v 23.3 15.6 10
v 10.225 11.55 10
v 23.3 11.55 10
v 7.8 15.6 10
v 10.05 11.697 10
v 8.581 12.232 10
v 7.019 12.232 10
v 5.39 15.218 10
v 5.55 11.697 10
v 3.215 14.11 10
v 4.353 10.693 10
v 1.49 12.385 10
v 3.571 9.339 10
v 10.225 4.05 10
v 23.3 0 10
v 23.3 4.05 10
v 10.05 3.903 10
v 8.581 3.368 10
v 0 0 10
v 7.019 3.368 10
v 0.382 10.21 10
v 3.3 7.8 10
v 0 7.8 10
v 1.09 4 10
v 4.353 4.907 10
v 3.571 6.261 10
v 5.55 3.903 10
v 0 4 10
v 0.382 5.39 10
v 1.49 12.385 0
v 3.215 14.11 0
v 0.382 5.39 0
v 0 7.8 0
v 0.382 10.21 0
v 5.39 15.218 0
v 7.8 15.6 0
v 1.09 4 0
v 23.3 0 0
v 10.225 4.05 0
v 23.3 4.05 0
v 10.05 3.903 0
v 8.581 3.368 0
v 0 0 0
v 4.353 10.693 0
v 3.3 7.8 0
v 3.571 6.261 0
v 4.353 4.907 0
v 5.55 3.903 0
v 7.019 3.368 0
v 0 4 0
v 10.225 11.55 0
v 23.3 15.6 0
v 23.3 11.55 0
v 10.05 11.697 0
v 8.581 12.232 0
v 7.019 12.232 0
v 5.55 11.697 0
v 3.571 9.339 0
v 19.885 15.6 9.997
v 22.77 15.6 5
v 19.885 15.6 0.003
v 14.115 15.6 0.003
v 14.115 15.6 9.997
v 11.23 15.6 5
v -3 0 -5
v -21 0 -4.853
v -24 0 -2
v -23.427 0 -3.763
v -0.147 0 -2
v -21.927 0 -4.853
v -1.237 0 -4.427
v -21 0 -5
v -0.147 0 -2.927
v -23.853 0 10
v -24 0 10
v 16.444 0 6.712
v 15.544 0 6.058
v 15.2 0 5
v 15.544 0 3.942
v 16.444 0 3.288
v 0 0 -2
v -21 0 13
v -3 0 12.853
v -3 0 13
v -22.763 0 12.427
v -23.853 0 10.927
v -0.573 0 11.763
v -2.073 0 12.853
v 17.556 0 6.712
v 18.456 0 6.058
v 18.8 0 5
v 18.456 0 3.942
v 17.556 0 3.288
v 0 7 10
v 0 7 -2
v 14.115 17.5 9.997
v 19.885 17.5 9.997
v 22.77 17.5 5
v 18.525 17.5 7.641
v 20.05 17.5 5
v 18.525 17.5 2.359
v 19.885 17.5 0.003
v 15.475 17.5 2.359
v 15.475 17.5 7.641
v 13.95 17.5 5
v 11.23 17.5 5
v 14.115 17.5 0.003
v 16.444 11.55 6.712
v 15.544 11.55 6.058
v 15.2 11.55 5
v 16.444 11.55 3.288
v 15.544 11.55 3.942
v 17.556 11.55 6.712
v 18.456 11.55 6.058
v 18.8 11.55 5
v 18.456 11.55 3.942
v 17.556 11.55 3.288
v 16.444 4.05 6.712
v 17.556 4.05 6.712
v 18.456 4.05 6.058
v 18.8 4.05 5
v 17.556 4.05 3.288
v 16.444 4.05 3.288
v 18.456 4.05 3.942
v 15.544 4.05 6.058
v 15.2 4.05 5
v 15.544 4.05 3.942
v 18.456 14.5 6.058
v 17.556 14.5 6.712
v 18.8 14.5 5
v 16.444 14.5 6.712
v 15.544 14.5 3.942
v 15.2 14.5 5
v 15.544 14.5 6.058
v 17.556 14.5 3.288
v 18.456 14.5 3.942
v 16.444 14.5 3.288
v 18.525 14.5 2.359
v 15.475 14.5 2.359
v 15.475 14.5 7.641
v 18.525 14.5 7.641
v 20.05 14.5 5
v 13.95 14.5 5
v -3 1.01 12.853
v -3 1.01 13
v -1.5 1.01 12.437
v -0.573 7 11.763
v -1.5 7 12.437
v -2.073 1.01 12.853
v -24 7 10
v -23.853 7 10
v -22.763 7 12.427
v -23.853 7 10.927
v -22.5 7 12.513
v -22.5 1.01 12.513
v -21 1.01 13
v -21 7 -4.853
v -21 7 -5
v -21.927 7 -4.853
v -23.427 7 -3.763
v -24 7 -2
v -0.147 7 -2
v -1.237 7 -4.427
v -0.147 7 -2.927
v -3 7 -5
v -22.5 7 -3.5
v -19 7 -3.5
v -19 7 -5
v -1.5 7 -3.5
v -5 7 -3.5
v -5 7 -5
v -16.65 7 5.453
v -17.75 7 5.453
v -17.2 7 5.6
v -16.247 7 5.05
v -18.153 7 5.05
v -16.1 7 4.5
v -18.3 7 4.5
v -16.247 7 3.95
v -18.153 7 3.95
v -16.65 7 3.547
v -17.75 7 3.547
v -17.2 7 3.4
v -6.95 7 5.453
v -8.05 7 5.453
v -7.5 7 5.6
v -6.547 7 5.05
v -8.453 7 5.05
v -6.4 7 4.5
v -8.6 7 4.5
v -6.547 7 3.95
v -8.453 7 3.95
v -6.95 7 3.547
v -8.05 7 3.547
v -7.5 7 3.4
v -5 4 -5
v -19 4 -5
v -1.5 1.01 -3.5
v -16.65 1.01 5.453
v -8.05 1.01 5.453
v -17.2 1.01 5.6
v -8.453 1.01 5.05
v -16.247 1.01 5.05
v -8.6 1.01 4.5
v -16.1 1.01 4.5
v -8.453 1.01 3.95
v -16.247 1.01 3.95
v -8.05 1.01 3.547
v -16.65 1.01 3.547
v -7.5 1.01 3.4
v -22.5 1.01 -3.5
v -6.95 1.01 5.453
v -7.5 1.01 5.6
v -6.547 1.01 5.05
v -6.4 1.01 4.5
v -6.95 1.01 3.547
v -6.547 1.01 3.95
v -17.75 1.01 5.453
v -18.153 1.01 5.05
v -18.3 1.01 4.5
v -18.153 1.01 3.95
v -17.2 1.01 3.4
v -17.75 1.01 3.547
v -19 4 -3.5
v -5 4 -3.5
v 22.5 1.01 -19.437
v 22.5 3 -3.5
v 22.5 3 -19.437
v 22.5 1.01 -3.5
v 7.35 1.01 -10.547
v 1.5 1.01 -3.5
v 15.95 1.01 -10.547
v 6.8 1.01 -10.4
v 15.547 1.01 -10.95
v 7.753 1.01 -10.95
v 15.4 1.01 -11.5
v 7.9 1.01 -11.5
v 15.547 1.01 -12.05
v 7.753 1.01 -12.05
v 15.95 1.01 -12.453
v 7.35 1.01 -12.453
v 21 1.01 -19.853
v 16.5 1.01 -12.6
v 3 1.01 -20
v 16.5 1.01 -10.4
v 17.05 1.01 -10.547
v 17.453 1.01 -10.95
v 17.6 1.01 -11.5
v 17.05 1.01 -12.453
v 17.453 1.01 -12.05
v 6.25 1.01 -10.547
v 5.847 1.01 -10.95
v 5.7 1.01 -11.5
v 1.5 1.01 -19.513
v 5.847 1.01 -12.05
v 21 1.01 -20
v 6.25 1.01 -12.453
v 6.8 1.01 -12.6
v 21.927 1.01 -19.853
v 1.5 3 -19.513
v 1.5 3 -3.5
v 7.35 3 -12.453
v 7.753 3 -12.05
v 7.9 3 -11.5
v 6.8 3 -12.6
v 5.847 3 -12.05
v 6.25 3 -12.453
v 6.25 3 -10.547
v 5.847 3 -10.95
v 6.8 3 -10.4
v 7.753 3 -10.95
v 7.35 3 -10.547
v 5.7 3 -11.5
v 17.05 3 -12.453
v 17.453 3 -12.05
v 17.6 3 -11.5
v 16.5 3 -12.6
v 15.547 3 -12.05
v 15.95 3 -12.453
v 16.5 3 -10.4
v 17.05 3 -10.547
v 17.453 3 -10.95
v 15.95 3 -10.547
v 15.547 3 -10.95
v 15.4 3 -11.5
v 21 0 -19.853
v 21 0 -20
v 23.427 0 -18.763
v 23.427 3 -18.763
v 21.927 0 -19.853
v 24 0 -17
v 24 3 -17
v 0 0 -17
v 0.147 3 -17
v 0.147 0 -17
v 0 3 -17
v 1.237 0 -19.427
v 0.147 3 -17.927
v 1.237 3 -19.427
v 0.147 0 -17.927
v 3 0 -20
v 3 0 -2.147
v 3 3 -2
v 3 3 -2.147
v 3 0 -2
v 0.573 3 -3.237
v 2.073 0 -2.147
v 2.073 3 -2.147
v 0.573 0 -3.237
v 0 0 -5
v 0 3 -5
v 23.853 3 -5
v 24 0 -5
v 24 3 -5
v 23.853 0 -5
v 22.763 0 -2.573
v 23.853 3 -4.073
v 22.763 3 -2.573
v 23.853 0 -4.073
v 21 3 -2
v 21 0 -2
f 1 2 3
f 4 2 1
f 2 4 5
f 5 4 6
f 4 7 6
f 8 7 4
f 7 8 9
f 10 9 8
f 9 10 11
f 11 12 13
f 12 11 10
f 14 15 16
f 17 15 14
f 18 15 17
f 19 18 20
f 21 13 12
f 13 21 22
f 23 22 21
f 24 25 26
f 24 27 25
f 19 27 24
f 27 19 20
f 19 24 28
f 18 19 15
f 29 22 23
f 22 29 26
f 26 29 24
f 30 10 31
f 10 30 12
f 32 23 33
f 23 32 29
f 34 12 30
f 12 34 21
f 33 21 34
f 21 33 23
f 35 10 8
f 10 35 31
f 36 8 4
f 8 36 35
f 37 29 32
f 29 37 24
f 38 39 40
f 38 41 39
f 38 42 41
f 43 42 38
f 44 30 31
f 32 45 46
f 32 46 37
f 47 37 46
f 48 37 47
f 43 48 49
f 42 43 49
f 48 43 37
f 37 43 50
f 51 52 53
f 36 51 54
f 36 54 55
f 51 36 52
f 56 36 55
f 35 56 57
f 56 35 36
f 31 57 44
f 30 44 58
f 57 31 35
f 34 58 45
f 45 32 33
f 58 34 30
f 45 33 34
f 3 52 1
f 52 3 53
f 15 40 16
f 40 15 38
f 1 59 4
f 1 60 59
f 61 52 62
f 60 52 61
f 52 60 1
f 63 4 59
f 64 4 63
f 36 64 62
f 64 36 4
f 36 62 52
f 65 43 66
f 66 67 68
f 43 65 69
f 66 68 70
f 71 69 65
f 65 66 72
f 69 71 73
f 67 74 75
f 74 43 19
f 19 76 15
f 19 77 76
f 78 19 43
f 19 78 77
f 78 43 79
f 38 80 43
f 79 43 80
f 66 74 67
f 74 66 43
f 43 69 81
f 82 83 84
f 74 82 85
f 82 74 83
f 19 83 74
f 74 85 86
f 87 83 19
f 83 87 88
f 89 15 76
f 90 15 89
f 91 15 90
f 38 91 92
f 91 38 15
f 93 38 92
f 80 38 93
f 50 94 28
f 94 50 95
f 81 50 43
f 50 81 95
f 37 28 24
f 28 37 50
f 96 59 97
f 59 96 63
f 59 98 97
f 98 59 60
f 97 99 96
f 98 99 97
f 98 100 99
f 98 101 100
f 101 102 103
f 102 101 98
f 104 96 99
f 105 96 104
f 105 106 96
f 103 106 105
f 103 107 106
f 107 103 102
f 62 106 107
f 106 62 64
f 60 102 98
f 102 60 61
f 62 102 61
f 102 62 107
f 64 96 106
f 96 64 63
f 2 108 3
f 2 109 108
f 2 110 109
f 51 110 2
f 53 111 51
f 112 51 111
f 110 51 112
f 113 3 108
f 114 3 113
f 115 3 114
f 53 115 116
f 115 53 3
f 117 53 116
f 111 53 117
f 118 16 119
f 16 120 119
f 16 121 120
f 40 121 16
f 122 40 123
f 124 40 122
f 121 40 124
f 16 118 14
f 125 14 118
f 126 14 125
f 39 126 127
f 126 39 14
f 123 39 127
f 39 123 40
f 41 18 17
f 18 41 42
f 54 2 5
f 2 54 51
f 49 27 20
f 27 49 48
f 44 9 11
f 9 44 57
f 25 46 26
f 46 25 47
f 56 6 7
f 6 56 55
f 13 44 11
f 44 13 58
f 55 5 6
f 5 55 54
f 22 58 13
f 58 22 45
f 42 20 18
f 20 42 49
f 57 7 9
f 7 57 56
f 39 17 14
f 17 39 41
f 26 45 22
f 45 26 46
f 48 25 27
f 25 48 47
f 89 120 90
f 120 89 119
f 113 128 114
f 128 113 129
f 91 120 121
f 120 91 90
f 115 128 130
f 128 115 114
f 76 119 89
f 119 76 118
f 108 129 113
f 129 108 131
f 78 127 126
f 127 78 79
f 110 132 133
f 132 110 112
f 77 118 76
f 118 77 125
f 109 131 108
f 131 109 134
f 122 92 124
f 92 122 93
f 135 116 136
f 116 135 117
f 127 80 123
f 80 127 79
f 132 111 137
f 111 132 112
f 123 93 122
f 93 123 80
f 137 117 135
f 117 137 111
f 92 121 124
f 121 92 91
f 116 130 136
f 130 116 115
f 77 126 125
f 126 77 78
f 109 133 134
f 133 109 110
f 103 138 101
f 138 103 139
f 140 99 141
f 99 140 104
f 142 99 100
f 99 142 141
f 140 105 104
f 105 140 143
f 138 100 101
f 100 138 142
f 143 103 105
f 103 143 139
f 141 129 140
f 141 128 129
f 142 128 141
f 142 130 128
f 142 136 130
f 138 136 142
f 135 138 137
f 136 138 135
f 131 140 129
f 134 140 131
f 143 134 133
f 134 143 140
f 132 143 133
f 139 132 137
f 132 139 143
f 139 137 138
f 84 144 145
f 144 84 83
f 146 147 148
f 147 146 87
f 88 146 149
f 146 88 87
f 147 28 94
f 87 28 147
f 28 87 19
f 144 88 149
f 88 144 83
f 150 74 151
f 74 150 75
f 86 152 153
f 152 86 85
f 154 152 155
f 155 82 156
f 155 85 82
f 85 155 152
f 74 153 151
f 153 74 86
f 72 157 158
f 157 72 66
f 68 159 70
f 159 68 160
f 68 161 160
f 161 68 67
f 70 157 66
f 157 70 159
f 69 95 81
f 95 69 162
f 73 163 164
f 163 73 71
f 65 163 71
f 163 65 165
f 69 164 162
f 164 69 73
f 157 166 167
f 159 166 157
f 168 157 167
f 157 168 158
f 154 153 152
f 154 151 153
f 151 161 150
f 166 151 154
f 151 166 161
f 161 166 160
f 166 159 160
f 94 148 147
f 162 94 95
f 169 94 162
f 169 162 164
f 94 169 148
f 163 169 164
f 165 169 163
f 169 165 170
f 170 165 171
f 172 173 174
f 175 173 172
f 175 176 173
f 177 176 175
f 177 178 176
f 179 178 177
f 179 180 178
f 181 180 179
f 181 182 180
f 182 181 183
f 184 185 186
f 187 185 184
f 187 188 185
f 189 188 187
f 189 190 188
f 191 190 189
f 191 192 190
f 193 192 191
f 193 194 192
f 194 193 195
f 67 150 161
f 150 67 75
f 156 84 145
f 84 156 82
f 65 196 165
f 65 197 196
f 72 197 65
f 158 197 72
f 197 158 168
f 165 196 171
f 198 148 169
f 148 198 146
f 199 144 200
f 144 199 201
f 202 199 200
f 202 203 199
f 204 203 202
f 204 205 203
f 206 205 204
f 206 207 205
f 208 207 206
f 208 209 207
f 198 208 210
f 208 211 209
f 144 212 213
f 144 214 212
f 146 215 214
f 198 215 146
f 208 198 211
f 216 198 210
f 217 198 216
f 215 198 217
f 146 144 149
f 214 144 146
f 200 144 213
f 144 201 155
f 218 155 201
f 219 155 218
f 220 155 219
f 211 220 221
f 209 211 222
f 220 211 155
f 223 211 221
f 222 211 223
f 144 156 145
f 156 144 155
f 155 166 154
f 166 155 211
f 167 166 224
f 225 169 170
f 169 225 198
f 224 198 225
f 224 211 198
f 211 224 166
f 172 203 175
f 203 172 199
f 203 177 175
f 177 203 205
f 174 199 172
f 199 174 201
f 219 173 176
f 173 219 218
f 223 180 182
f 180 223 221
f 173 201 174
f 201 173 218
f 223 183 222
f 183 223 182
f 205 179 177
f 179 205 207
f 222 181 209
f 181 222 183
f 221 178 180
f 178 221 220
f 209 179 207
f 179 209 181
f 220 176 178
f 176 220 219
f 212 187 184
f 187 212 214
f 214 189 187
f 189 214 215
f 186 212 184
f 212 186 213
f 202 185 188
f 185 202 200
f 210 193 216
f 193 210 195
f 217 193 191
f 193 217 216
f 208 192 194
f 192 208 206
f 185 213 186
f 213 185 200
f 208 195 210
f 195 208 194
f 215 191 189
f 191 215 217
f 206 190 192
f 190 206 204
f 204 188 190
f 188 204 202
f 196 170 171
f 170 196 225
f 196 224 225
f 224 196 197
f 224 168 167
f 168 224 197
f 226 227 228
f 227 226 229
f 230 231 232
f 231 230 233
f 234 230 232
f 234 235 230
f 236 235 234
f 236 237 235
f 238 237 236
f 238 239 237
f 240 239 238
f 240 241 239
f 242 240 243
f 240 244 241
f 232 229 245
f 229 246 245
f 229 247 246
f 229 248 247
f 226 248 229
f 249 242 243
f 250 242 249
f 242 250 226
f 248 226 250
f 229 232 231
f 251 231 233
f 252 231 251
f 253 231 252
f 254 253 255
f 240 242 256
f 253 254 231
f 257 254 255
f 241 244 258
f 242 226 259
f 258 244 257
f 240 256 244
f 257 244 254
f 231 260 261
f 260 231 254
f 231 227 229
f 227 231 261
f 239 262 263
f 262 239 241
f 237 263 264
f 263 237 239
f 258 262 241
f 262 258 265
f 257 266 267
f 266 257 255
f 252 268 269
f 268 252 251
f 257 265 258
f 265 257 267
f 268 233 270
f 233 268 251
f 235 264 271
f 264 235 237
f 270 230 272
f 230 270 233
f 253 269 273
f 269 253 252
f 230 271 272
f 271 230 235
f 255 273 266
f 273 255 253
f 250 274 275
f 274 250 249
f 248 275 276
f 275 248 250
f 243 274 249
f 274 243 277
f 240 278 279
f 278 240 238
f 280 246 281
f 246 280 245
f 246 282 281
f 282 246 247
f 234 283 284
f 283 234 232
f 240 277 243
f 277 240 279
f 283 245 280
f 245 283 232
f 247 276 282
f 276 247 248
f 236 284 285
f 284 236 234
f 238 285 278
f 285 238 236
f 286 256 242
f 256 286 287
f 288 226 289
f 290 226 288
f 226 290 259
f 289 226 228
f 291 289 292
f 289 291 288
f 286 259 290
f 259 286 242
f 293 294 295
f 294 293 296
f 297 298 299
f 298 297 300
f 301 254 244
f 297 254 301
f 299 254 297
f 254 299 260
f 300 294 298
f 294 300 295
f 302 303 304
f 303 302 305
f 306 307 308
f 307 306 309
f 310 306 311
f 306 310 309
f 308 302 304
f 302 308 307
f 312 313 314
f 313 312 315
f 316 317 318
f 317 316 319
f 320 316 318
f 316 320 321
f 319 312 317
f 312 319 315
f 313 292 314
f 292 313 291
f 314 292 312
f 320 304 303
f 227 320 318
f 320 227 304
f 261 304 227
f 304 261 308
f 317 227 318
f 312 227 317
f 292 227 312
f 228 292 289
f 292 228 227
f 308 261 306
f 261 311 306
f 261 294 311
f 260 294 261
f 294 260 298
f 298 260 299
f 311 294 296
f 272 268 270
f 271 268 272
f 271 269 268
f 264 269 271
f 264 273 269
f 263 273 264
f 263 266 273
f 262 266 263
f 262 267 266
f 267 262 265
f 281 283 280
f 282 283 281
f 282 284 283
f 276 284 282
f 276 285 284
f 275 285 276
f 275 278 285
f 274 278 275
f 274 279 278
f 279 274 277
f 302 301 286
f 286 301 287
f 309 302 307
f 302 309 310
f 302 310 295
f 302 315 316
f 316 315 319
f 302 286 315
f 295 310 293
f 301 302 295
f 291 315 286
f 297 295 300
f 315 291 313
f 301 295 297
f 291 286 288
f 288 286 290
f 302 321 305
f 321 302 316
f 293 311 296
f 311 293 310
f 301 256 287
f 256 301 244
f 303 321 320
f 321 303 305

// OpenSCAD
// file: inc/functions.scad
// PRUSA iteration3
// Functions used in many files
// GNU GPL v3
// Josef Průša <josefprusa@me.com>
// Václav 'ax' Hůla <axtheb@gmail.com>
// Vlnofka <>
// http://www.reprap.org/wiki/Prusa_Mendel
// http://github.com/prusajr/PrusaMendel

module roundcorner(diameter){
	difference(){
		cube(size = [diameter,diameter,99], center = false);
		translate(v = [diameter, diameter, 0]) cylinder(h = 100, r=diameter, center=true);
	}
}
module nut(d,h,horizontal=true){
    cornerdiameter =  (d / 2) / cos (180 / 6);
    cylinder(h = h, r = cornerdiameter, $fn = 6);
    if(horizontal){
        for(i = [1:6]){
            rotate([0,0,60*i]) translate([-cornerdiameter-0.2,0,0]) rotate([0,0,-45]) cube([2,2,h]);
        }
    }
}

// Based on nophead research
module polyhole(d, h, center=false) {
    n = max(round(2 * d),3);
    rotate([0,0,180])
        cylinder(h = h, r = (d / 2) / cos (180 / n), $fn = n);
}

// make it interchangeable between this and cylinder
module cylinder_poly(r, h, center=false){
    polyhole(d=r*2, h=h, center=center);
}

module fillet(radius, height=100, $fn=0) {
    //this creates acutal fillet
    translate([-radius, -radius, -height/2-0.01])
        difference() {
            cube([radius*2, radius*2, height+0.02]);
            cylinder(r=radius, h=height+0.02, $fn=$fn);
        }
}

module cube_fillet(size, radius=-1, vertical=[3,3,3,3], top=[0,0,0,0], bottom=[0,0,0,0], center=false, $fn=0){
    //
    if (center) {
        cube_fillet_inside(size, radius, vertical, top, bottom, $fn);
    } else {
        translate([size[0]/2, size[1]/2, size[2]/2])
            cube_fillet_inside(size, radius, vertical, top, bottom, $fn);
    }
}

module cube_negative_fillet(size, radius=-1, vertical=[3,3,3,3], top=[0,0,0,0], bottom=[0,0,0,0], $fn=0){

    j=[1,0,1,0];

    for (i=[0:3]) {
        if (radius > -1) {
            rotate([0, 0, 90*i]) translate([size[1-j[i]]/2, size[j[i]]/2, 0]) fillet(radius, size[2], $fn=$fn);
        } else {
            rotate([0, 0, 90*i]) translate([size[1-j[i]]/2, size[j[i]]/2, 0]) fillet(vertical[i], size[2], $fn=$fn);
        }
        rotate([90*i, -90, 0]) translate([size[2]/2, size[j[i]]/2, 0 ]) fillet(top[i], size[1-j[i]], $fn=$fn);
        rotate([90*(4-i), 90, 0]) translate([size[2]/2, size[j[i]]/2, 0]) fillet(bottom[i], size[1-j[i]], $fn=$fn);

    }
}

module cube_fillet_inside(size, radius=-1, vertical=[3,3,3,3], top=[0,0,0,0], bottom=[0,0,0,0], $fn=0){
    //makes CENTERED cube with round corners
    // if you give it radius, it will fillet vertical corners.
    //othervise use vertical, top, bottom arrays
    //when viewed from top, it starts in upper right corner (+x,+y quadrant) , goes counterclockwise
    //top/bottom fillet starts in direction of Y axis and goes CCW too


    if (radius == 0) {
        cube(size, center=true);
    } else {
        difference() {
            cube(size, center=true);
            cube_negative_fillet(size, radius, vertical, top, bottom, $fn);
        }
    }
}


module nema17(places=[1,1,1,1], size=15.5, h=10, holes=false, shadow=false, $fn=24){
    for (i=[0:3]) {
        if (places[i] == 1) {
            rotate([0, 0, 90*i]) translate([size, size, 0]) {
                if (holes) {
                    #rotate([0, 0, -90*i])  translate([0,0,-10]) screw(r=1.7, slant=false, head_drop=13, $fn=$fn, h=h+12);
                } else {
                    rotate([0, 0, -90*i]) cylinder(h=h, r=5.5, $fn=$fn);
                }
            }
        }
    }
    if (shadow != false) {
        %translate ([0, 0, shadow+21+3]) cube([42,42,42], center = true);
    //flange
        %translate ([0, 0, shadow+21+3-21-1]) cylinder(r=11,h=2, center = true, $fn=20);
    //shaft
        %translate ([0, 0, shadow+21+3-21-7]) cylinder(r=2.5,h=14, center = true);
    }
}

module screw(h=20, r=2, r_head=3.5, head_drop=0, slant=true, poly=false, $fn=0){
    //makes screw with head
    //for substraction as screw hole
    if (poly) {
        cylinder_poly(h=h, r=r, $fn=$fn);
    } else {
        cylinder(h=h, r=r, $fn=$fn);
    }
    if (slant) {
        translate([0, 0, head_drop-0.01]) cylinder(h=r_head, r2=0, r1=r_head, $fn=$fn);
    }

    if (head_drop > 0) {
        translate([0, 0, -0.01]) cylinder(h=head_drop+0.01, r=r_head, $fn=$fn);
    }
}
module screw_cylinder(r_head=5.25,r=3.25,head_drop=6.2,slant=false){
	screw(r_head=r_head,head_drop=head_drop,r=r, slant=slant);

}

//screw_cylinder();
//cube_fillet([10,20,30], vertical=[3,2,0,0], top=[3,2,0,5], bottom=[3,2,0,5]);
//cube_fillet([10,20,30], radius=2, top=[7,2,7,2]);
// file: inc/metric.scad
// PRUSA iteration3
// Default metric sizes
// GNU GPL v3
// Josef Průša <josefprusa@me.com>
// http://www.reprap.org/wiki/Prusa_Mendel
// http://github.com/prusajr/PrusaMendel

// DONT CHANGE THIS FILE! ALTER VALUES IN CONFIGURATION.SCAD INSTEAD

// RODS

threaded_rod_diameter = 8.7;
threaded_rod_diameter_horizontal = 8.7;
smooth_bar_diameter = 8;
smooth_bar_diameter_horizontal = 8.8;

// Nuts and bolts

m8_diameter = 9;
m8_nut_diameter = 14.1;

m4_diameter = 4.5;
m4_nut_diameter = 9;
m4_nut_diameter_horizontal=4.8;

m3_diameter = 3.6;
m3_nut_diameter = 5.3;
m3_nut_diameter_horizontal = 6.1;

// Bushing holder

bushing_core_diameter = smooth_bar_diameter;
bushing_material_thickness = 1;

// Motors

motor_shaft = 5.5;
// file: configuration.scad
// PRUSA iteration3
// Configuration file
// GNU GPL v3
// Josef Průša <josefprusa@me.com>
// Václav 'ax' Hůla <axtheb@gmail.com>
// http://www.reprap.org/wiki/Prusa_Mendel
// http://github.com/prusajr/PrusaMendel

// PLEASE SELECT ONE OF THE CONFIGURATIONS BELOW
// BY UN-COMMENTING IT

// Uncomment for metric settings
// METRIC METRIC METRIC METRIC METRIC METRIC METRIC METRIC 

include <inc/metric.scad>;

// Custom settings here, tailor to your supplies and print settings

// Select your belt type ******************************************************

//T2.5
//belt_tooth_distance = 2.5;
//belt_tooth_ratio = 0.5;

//T5 (strongly discouraged)
belt_tooth_distance = 5;
belt_tooth_ratio = 0.75;

//HTD3
//belt_tooth_distance = 3;
//belt_tooth_ratio = 0.75;

//MXL
//belt_tooth_distance = 2.032;
//belt_tooth_ratio = 0.64;

// Choose bearing/bushing configuration ***************************************

//Choose from:

// 0 = Z as lm[e]8uu, X and Y bushings
// 1 = all bushings
// 2 = all bearings [default. Do not change unless you really know what you are doing]
// DO NOT OFFER 0 or 1 VARIANTS FOR SALE. We really mean that. In the long run it hurts everyone.

bearing_choice = 2;

// Bushing version
// 0 = square igus housings. By igus we mean JFM-0810-10 or GFM-0810-10
// 1 = round igus (works better if printed precisely)
// 2 = bronze self-aligning bushings
bushing_type = 0;

//Bearing version
// 0 = default lm8uu
// 1 = lme8uu
bearing_type = 0;

// Select idler bearing size **************************************************

// 0 = 608 [standard skate bearings]
// 1 = 624 [roughly same diameter as pulley, makes belt parallel so its prettier]

idler_bearing = 0;

// Thickness of the XZ plate board
board_thickness = 12;

//Layer height * width over thickness. Used for idler sleeve
single_wall_width = 0.3*2.2;

// END of custom settings


// You are not supposed to change this
board_to_xz_distance = 26;
xaxis_rod_distance = 45;
carriage_l = 74;
carriage_hole_to_side = 5;
carriage_hole_height = 4;

//calculated from settings

idler_size = (idler_bearing == 0) ? 22 : 13;

//use 4.5 for 608, 2.5 for 624
idler_size_inner_r = (idler_bearing == 0) ? 4.5 : 2.5;

idler_width = (idler_bearing == 0) ? 9 : 5;

// CHANGE ONLY THE STUFF YOU KNOW
// IT WILL REPLACE DEFAULT SETTING

// RODS

// threaded_rod_diameter = 0;
// threaded_rod_diameter_horizontal = 0;
// smooth_bar_diameter = 0;
// smooth_bar_diameter_horizontal = 0;

// Nuts and bolts

// m8_diameter = 0;
// m8_nut_diameter = 0;

// m4_diameter = 0;
// m4_nut_diameter = 0;

// m3_diameter = 0;
// m3_nut_diameter = 0;

// Bushing holder

// bushing_core_diameter = smooth_bar_diameter;
// bushing_material_thickness = 0;

///counted stuff
m3_nut_diameter_bigger = ((m3_nut_diameter  / 2) / cos (180 / 6))*2;

// functions
include <inc/functions.scad>


// These constants define the geometry of the complete-printer.scad

//x_smooth_rod_length=325;
//y_smooth_rod_length=405;
//z_smooth_rod_length=235;
bed_x_size=225;
bed_y_size=225;

x_smooth_rod_length=450+board_thickness*2+10; // 492 for 16mm thickness; 484 for 12mm thickness
y_smooth_rod_length=470;
z_smooth_rod_length=405;  
bed_x_size=225;
bed_y_size=225;
// main file
// PRUSA Mendel  
// Endstop holder
// Used to attach endstops to 8mm rods
// GNU GPL v3
// Josef Průša
// josefprusa@me.com
// prusadjs.cz
// http://www.reprap.org/wiki/Prusa_Mendel
// http://github.com/prusajr/PrusaMendel

include <configuration.scad>

/**
 * @id endstop-holder
 * @name Endstop holder
 * @category Printed
 * @using 1 m3x20xhex
 * @using 1 m3nut
 * @using 2 m3washer
 */

endstop();
translate([0,0,-2])rotate([-90,0,0])box_top();
module microswitch(){
	difference(){
		cube([21,18,6.5]);
		translate([5.3,8,-1])cylinder(r=1.1,h=8,$fn=12);
		translate([15,8,-1])cylinder(r=1.1,h=8,$fn=12);
	}
}

module endstop(){
	outer_diameter = m8_diameter/2+3.3;
	opening_size = m8_diameter-1.5; //openingsize

	difference(){
		union(){
			translate([outer_diameter, outer_diameter, 0]) cylinder(h =10, r = outer_diameter, $fn = 20);
			translate([outer_diameter, 0, 0]) cube([15.5,outer_diameter*2,10]);
			translate([-0, 0, 0]) cube([10, 4, 10]);
			translate([17, 17.5, 5]) rotate([90, 0, 0]) #cylinder(h =5, r = 5.77, $fn = 6);
		}
		translate([9, outer_diameter-opening_size/2, 0]) cube([18,opening_size,20]);
		translate([outer_diameter, outer_diameter, 0]) cylinder(h =20, r = m8_diameter/2, $fn = 18);

		//Securing hole
		translate([17, 17, 5]) rotate([90, 0, 0]) cylinder(h =20, r = m3_diameter/2, $fn = 10);
		translate([17, 19.5, 5]) rotate([90, 0, 0]) #cylinder(h =5, r = m3_nut_diameter_horizontal/2, $fn = 6);

		translate([17, 17, 5]) rotate([90, 0, 0]) #cylinder(h =20, r = m3_diameter/2, $fn = 10);

		//microswitch();
	
	}
	translate([-24,0,-5])rotate([90,0,0])mirror([0,0,1])box_bottom();
	
}

module box_bottom(){
	difference(){
		cube_fillet([24,18,7],$fn=24);
		translate([1.5,1.5,1.01])color("red")microswitch();
		translate([5,-3,4])cube([14,5,5]);
	}
}

module box_top(){
	difference(){
		cube_fillet([24,18,3],$fn=24);
		translate([1.5,1.5,1.01])color("red")microswitch();
		
	}
}
